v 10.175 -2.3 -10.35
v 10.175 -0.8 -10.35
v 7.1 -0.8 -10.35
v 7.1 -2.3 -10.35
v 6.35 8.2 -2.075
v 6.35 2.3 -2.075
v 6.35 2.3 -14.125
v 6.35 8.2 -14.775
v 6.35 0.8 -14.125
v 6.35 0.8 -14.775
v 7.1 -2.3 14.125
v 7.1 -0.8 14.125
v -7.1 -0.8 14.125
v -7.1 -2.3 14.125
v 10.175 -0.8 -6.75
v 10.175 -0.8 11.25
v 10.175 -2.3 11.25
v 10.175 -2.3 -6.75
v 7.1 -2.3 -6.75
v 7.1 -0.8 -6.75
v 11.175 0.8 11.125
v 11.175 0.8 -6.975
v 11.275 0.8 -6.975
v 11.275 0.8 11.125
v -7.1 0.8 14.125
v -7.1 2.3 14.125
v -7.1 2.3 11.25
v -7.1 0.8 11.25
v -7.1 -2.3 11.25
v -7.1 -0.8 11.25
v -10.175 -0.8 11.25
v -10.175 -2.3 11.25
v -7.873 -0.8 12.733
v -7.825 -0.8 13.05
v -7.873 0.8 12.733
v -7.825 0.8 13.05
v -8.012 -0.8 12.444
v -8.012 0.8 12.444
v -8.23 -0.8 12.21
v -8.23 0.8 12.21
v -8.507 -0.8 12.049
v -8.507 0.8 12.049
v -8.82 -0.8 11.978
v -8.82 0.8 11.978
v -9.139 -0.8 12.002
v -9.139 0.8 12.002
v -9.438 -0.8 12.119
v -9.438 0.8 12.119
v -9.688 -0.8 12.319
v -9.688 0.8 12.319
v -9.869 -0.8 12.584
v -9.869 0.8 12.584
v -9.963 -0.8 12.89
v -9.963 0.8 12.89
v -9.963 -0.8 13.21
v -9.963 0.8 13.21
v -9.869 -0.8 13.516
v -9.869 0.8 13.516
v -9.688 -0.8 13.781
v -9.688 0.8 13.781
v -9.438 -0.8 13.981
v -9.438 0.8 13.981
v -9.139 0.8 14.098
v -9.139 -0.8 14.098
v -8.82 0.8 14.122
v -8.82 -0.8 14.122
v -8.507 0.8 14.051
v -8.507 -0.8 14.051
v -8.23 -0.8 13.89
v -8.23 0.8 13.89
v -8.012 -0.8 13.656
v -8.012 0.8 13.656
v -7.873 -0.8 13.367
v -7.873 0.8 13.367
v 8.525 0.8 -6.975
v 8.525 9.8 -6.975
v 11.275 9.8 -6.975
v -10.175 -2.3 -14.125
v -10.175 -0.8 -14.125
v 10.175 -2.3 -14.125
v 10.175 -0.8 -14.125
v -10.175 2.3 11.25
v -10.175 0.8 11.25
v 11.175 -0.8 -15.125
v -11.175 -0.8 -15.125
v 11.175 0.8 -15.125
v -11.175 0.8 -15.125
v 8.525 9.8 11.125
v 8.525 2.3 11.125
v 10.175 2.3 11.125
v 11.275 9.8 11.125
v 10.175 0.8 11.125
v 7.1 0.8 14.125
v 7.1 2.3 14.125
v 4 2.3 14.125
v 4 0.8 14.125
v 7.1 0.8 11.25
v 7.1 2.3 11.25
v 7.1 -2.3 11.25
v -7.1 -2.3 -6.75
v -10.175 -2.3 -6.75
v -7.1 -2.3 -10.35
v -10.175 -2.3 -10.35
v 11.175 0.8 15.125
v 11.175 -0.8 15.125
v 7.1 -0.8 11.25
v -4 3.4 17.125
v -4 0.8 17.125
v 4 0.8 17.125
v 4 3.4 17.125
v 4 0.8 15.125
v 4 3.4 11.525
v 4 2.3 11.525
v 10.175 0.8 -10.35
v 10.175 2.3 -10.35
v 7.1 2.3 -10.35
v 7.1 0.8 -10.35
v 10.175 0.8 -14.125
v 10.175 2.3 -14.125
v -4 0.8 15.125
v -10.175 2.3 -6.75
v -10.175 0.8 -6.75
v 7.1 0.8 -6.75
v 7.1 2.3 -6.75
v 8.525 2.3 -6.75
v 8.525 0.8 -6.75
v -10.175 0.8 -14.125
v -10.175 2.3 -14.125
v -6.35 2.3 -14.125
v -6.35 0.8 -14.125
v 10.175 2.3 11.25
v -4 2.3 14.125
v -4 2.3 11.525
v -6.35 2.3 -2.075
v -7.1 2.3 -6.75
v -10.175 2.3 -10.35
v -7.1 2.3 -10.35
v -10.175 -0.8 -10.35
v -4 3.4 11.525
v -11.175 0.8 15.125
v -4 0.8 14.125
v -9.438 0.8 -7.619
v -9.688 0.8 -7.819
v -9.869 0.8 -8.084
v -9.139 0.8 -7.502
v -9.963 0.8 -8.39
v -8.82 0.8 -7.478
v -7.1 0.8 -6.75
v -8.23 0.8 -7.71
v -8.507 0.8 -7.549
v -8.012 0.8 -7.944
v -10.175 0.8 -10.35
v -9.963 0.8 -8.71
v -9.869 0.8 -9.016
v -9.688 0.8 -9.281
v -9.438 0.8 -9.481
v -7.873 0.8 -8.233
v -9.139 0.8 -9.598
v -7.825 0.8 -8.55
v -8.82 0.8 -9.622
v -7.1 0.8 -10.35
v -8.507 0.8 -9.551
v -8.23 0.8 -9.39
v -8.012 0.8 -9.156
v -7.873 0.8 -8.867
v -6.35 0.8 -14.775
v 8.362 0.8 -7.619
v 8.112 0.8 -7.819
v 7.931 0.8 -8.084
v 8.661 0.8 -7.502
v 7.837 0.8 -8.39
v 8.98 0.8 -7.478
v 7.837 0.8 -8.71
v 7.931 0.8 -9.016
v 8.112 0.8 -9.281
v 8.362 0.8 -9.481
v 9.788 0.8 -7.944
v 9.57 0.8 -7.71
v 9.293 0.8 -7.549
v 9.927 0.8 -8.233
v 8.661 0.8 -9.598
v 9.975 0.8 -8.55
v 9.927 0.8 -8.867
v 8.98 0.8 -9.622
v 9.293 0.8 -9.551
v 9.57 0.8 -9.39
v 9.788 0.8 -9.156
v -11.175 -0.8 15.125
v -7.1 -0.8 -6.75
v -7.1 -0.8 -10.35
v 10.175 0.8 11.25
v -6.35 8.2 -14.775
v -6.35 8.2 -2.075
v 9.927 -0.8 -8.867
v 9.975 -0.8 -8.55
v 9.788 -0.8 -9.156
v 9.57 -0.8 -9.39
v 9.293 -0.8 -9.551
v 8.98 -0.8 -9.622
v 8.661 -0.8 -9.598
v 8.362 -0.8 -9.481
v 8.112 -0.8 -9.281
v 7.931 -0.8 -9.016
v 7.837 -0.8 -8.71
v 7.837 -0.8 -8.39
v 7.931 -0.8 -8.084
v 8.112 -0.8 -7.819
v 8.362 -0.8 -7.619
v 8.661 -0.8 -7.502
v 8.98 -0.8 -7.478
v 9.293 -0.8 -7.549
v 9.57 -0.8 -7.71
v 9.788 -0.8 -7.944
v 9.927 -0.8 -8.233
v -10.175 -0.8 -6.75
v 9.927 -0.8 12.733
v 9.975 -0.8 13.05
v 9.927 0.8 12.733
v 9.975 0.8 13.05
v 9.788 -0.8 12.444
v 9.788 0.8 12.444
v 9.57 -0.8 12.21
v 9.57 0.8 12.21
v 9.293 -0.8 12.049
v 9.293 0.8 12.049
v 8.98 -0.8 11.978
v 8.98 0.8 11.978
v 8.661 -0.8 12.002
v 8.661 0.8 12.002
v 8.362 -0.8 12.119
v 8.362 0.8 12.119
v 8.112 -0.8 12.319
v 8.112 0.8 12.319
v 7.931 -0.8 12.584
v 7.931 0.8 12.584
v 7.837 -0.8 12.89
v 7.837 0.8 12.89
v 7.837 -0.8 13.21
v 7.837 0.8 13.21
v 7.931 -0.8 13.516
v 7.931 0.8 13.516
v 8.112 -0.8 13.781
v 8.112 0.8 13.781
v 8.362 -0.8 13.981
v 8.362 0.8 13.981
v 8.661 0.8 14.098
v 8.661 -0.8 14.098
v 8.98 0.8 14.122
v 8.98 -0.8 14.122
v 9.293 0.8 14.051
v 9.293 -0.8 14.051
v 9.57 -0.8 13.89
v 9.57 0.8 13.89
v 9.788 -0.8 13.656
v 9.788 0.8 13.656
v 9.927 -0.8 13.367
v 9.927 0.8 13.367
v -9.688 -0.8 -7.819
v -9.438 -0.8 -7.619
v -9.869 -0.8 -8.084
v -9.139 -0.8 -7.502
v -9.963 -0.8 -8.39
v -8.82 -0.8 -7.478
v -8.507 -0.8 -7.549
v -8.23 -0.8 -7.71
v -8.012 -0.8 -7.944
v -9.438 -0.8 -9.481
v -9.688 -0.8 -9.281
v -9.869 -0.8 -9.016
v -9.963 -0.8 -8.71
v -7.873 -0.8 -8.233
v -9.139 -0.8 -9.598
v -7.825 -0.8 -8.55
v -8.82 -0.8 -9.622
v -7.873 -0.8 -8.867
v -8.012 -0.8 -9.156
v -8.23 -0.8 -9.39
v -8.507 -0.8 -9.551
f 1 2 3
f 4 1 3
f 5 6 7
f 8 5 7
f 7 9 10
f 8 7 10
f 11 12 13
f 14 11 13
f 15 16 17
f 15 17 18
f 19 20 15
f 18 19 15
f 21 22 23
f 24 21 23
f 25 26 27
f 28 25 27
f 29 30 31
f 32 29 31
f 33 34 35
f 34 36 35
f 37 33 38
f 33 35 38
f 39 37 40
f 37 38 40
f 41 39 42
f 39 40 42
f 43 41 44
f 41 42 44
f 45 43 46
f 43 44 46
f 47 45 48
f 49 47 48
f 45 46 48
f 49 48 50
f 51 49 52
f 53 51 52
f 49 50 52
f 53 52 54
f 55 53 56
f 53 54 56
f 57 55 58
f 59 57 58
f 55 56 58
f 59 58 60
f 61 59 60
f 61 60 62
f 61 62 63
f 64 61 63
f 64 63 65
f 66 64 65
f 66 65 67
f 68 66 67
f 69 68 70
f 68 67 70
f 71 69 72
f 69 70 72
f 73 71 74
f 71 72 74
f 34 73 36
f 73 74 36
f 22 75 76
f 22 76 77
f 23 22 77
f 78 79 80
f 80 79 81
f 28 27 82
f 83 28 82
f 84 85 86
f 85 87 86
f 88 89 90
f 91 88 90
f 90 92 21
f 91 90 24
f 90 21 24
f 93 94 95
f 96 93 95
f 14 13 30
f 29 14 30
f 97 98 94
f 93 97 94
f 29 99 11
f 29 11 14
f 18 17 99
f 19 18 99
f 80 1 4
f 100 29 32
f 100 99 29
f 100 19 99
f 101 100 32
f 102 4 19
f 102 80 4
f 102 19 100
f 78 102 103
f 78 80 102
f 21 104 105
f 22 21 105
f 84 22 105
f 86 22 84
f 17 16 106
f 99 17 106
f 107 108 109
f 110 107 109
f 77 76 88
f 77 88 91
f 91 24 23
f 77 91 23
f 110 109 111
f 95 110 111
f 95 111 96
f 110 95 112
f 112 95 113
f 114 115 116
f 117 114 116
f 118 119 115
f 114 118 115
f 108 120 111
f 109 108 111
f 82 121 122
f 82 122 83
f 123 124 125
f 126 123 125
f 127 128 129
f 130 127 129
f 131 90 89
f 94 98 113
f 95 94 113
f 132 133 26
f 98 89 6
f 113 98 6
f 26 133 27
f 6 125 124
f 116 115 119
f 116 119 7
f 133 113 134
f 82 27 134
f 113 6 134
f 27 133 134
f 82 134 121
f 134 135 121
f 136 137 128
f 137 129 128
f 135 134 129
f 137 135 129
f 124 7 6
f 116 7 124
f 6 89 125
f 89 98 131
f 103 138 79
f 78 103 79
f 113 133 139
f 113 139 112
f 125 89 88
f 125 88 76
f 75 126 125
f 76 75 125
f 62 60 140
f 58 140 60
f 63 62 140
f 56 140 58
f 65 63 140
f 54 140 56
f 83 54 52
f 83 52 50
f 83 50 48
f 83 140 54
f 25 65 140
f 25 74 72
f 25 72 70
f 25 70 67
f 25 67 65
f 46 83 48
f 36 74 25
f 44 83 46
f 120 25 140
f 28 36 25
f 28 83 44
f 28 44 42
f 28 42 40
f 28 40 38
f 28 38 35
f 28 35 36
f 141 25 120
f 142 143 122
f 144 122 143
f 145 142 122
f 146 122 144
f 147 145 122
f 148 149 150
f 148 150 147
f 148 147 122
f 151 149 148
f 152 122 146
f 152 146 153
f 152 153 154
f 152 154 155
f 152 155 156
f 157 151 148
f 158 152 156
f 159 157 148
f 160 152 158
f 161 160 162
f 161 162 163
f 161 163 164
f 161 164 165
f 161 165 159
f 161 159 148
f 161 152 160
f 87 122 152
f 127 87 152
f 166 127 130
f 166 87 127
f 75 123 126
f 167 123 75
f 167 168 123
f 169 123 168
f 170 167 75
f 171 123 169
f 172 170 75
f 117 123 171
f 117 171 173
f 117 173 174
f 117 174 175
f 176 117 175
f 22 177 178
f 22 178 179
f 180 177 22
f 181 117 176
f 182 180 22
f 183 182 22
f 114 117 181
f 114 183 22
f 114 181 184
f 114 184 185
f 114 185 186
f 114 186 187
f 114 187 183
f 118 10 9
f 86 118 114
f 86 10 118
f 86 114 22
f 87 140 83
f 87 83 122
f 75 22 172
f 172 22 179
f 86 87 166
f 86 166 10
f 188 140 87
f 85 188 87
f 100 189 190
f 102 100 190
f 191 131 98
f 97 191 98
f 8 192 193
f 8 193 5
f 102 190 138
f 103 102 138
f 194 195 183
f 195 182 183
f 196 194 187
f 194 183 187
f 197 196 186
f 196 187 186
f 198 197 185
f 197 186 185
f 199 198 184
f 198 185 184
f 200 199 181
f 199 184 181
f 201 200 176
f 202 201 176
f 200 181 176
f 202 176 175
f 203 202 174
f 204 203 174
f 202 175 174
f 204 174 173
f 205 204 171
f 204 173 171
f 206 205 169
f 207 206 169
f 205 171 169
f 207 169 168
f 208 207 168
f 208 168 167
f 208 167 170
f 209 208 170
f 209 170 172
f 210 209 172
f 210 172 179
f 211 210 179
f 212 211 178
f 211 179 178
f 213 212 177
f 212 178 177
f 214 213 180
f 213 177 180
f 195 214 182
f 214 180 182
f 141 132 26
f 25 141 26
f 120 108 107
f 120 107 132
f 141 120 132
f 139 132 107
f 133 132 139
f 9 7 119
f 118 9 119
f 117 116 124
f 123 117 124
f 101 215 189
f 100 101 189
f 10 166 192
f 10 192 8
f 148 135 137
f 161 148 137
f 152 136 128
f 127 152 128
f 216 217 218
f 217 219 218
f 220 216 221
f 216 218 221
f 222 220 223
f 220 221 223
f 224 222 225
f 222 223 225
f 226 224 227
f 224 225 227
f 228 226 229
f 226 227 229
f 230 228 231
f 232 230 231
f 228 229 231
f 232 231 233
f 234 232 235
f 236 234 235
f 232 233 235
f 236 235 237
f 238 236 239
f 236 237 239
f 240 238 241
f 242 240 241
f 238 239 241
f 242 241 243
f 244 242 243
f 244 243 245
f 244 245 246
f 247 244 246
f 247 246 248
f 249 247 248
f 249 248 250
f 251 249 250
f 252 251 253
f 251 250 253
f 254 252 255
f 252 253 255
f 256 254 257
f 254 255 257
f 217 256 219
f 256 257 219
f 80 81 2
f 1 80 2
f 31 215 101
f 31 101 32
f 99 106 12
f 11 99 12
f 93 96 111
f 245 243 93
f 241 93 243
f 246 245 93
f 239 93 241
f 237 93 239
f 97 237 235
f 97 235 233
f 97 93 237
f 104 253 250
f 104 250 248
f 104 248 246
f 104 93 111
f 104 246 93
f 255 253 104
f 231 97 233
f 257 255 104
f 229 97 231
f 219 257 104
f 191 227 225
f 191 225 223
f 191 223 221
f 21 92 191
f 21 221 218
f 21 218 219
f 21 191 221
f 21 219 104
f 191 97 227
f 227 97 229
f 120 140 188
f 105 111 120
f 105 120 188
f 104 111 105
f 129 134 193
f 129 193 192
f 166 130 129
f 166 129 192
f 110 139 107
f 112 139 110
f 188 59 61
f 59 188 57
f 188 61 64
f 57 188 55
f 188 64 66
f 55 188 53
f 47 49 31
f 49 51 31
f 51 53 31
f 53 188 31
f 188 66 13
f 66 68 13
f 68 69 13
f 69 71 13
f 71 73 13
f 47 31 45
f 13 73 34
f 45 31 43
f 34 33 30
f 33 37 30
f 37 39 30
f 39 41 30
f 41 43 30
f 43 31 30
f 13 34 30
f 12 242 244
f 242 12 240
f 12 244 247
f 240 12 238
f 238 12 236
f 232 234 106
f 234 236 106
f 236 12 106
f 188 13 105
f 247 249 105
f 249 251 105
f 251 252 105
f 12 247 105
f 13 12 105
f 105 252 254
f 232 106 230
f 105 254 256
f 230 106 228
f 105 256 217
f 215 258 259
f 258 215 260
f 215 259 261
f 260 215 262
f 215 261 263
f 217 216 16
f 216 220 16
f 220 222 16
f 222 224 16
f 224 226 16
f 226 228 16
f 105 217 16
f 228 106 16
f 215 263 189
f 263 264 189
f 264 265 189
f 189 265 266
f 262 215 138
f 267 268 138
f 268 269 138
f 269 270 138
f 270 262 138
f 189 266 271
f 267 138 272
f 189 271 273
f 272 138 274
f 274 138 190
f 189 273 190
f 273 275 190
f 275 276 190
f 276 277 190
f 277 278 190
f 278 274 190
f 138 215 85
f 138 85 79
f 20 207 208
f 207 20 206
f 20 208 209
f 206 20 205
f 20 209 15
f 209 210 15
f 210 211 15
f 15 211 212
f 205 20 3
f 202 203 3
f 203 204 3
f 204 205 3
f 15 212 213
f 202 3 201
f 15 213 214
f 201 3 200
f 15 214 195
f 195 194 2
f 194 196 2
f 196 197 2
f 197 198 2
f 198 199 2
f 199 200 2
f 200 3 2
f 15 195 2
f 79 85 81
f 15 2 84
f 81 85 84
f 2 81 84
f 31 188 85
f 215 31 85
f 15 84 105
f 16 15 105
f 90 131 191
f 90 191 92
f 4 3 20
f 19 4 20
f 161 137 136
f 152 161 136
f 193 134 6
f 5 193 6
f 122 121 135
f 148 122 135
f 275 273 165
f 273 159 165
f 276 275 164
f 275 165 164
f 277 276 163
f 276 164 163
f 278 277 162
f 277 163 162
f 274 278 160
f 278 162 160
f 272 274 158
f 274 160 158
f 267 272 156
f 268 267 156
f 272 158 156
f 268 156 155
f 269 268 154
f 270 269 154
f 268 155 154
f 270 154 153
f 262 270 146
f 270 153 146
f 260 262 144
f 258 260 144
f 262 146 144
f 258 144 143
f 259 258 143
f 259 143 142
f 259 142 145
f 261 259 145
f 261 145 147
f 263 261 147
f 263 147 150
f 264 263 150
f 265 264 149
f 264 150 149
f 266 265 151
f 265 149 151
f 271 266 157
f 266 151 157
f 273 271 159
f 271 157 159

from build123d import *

# Parameters (mm, degrees)
SKETCH1_W               = 22.35
SKETCH1_H               = 30.25
BOSS_EXTRUDE1_DEPTH     = 0.8
SKETCH2_R               = 1.075
CUT_EXTRUDE1_DEPTH      = 1.8
CUT_EXTRUDE1_DEPTH_BACK = 1.8
BOSS_EXTRUDE2_DEPTH     = 2.3
SKETCH4_W               = 8
SKETCH4_H               = 5.6
BOSS_EXTRUDE3_DEPTH     = 2.6
SKETCH5_W               = 12.7
SKETCH5_H               = 12.7
BOSS_EXTRUDE4_DEPTH     = 7.4
SKETCH6_W               = 2.75
SKETCH6_H               = 18.1
BOSS_EXTRUDE5_DEPTH     = 9


with BuildPart() as part:
    # Sketch1 → Boss-Extrude1 (new body, symmetric)
    with BuildSketch(Plane(origin=(0, 0, 0), x_dir=(1, 0, 0), z_dir=(0, 1, 0))):
        Rectangle(SKETCH1_W, SKETCH1_H)
    extrude(amount=BOSS_EXTRUDE1_DEPTH, both=True)

    # Sketch2 → Cut-Extrude1 (cut, two sides)
    with BuildSketch(Plane(origin=(0, 0, 0), x_dir=(1, 0, 0), z_dir=(0, 1, 0))) as cut_extrude1_sk:
        with Locations((8.9, 8.55)):
            Circle(SKETCH2_R)
        with Locations((8.9, -13.05)):
            Circle(SKETCH2_R)
        with Locations((-8.9, 8.55)):
            Circle(SKETCH2_R)
        with Locations((-8.9, -13.05)):
            Circle(SKETCH2_R)
    extrude(amount=CUT_EXTRUDE1_DEPTH, mode=Mode.SUBTRACT)
    extrude(cut_extrude1_sk.sketch, amount=-CUT_EXTRUDE1_DEPTH_BACK, mode=Mode.SUBTRACT)

    # Sketch3 → Boss-Extrude2 (add, symmetric)
    with BuildSketch(Plane(origin=(0, 0, 0), x_dir=(1, 0, 0), z_dir=(0, 1, 0))):
        Polygon((-10.175, 6.75), (-7.1, 6.75), (-7.1, 10.35), (-10.175, 10.35), (-10.175, 14.125), (10.175, 14.125), (10.175, 10.35), (7.1, 10.35), (7.1, 6.75), (10.175, 6.75), (10.175, -2.25), (10.175, -11.25), (7.1, -11.25), (7.1, -14.125), (-7.1, -14.125), (-7.1, -11.25), (-10.175, -11.25), (-10.175, -2.25), align=None)
    extrude(amount=BOSS_EXTRUDE2_DEPTH, both=True)

    # Sketch4 → Boss-Extrude3 (add)
    with BuildSketch(Plane(origin=(0, 0.8, 0), x_dir=(1, 0, 0), z_dir=(0, 1, 0))):
        with Locations((0, -14.325)):
            Rectangle(SKETCH4_W, SKETCH4_H)
    extrude(amount=BOSS_EXTRUDE3_DEPTH)

    # Sketch5 → Boss-Extrude4 (add)
    with BuildSketch(Plane(origin=(0, 0.8, 0), x_dir=(1, 0, 0), z_dir=(0, 1, 0))):
        with Locations((0, 8.425)):
            Rectangle(SKETCH5_W, SKETCH5_H)
    extrude(amount=BOSS_EXTRUDE4_DEPTH)

    # Sketch6 → Boss-Extrude5 (add)
    with BuildSketch(Plane(origin=(0, 0.8, 0), x_dir=(1, 0, 0), z_dir=(0, 1, 0))):
        with Locations((9.9, -2.075)):
            Rectangle(SKETCH6_W, SKETCH6_H)
    extrude(amount=BOSS_EXTRUDE5_DEPTH)


solid = part.part
